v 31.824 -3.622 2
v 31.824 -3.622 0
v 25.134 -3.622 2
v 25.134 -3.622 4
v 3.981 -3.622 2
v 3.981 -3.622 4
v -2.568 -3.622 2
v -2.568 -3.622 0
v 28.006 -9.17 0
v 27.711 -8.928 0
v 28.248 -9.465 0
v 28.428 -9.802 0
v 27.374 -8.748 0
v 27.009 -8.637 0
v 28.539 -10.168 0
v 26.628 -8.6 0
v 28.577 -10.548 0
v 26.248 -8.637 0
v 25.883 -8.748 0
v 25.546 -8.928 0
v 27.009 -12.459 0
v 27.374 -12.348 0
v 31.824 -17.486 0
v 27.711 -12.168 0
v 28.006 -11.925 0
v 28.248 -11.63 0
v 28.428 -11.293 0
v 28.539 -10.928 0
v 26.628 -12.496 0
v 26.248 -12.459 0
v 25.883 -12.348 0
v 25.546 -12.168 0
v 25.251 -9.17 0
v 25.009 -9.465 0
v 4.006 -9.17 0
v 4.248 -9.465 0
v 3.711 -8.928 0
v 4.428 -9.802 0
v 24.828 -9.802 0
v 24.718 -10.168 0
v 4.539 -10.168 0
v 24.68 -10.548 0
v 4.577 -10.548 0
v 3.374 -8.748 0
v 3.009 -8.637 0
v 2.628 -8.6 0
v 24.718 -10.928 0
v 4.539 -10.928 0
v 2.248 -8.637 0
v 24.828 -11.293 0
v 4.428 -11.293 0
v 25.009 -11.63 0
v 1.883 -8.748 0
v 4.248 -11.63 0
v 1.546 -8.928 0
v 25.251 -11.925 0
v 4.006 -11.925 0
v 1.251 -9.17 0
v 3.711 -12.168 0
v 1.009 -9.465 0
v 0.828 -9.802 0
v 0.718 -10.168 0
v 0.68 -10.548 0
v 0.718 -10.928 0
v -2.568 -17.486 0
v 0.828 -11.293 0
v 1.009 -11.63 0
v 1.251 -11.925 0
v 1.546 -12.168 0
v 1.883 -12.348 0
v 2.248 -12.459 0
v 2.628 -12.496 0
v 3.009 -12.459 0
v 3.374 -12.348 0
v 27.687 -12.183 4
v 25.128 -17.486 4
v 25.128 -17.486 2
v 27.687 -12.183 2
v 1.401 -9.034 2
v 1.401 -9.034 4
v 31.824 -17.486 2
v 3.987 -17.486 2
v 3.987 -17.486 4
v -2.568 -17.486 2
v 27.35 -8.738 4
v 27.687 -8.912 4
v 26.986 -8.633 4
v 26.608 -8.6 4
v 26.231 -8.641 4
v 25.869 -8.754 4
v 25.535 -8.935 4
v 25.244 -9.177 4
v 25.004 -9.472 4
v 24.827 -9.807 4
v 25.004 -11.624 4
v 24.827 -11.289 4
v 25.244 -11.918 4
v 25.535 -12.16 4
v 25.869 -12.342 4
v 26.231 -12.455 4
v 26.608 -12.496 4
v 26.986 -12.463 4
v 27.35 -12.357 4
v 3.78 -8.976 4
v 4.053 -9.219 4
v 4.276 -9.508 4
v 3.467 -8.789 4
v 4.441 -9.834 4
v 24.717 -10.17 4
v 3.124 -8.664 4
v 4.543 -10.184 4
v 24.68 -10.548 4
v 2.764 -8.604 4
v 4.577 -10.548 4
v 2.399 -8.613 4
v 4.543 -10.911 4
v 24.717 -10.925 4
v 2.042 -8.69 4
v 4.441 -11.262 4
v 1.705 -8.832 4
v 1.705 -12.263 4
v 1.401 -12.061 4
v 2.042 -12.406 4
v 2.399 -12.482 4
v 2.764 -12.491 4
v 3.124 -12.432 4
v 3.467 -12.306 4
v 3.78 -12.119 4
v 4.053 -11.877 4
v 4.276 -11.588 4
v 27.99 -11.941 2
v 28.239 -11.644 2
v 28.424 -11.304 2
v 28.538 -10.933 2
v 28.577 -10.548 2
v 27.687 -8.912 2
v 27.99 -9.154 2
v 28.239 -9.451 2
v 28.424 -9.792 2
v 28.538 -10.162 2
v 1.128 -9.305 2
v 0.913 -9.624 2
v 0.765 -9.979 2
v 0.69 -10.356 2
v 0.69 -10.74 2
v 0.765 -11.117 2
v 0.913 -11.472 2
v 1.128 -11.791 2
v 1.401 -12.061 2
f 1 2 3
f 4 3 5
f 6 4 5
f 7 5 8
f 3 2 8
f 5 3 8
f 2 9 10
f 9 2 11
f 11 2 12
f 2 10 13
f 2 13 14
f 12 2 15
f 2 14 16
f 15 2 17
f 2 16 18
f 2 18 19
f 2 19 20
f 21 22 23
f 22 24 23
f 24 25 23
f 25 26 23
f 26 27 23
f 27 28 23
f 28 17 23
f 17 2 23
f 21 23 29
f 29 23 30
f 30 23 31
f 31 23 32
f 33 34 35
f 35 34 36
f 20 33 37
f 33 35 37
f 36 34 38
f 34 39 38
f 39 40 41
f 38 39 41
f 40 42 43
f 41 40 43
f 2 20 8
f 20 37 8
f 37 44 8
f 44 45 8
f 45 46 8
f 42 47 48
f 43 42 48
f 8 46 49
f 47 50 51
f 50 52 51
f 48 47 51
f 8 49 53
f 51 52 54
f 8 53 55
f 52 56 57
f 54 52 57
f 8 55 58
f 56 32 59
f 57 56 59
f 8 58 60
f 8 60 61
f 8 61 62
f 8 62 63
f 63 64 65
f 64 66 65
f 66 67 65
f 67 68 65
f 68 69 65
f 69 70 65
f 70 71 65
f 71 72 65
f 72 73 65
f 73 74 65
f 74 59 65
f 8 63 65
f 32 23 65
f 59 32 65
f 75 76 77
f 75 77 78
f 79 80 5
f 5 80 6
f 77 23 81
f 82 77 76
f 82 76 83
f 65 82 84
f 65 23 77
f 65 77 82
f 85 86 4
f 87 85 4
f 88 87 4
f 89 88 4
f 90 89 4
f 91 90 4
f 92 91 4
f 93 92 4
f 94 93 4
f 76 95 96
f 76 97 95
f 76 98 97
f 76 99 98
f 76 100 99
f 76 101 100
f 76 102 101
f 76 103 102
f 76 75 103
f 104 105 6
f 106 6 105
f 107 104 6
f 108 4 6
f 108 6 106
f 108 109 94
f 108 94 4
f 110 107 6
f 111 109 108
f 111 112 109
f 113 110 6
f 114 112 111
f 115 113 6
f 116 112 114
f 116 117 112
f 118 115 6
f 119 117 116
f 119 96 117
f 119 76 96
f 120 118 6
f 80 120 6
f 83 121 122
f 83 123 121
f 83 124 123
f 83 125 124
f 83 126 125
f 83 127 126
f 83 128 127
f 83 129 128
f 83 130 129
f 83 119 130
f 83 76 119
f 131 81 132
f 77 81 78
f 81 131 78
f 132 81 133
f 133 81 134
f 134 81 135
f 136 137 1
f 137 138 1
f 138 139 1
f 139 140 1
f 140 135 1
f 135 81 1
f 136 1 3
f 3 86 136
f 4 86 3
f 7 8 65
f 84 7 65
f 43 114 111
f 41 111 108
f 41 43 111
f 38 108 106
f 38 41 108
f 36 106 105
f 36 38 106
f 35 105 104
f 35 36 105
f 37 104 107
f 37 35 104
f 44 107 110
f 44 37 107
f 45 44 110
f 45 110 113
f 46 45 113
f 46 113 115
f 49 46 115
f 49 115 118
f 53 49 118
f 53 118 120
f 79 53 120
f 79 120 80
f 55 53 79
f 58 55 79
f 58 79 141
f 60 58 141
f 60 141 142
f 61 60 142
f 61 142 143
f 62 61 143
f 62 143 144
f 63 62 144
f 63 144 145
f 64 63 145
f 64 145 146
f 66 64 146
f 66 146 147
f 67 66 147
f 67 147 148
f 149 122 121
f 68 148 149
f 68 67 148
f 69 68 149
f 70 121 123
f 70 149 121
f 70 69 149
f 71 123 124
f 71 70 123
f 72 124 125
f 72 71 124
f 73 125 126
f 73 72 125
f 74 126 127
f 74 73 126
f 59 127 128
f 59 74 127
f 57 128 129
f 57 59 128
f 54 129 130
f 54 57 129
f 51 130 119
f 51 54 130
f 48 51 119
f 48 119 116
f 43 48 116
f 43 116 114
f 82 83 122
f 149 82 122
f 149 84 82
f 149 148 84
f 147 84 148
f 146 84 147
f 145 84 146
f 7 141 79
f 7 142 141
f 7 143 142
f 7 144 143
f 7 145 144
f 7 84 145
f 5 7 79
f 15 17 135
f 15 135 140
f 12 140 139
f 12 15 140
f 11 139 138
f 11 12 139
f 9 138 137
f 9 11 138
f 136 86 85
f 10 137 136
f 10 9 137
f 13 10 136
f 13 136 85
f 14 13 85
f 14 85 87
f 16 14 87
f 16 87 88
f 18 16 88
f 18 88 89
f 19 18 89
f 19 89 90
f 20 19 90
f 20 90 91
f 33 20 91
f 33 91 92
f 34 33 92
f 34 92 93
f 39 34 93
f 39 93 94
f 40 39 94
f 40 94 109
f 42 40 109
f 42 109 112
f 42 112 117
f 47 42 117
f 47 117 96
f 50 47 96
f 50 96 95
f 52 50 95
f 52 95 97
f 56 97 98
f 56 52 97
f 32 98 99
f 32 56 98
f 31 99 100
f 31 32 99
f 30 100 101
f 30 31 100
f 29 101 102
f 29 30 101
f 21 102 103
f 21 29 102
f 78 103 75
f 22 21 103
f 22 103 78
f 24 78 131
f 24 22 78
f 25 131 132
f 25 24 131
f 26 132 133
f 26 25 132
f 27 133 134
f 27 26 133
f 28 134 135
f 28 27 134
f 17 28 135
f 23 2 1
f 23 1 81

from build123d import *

# Parameters (mm, degrees)
SKETCH3_W           = 34.39206684
SKETCH3_H           = 13.864626052
SKETCH3_R           = 1.948262706
BOSS_EXTRUDE1_DEPTH = 4
CUT_EXTRUDE2_DEPTH  = 2


with BuildPart() as part:
    # Sketch3 → Boss-Extrude1 (new body)
    with BuildSketch(Plane(origin=(0, 0, 0), x_dir=(-1, 0, 0), z_dir=(0, 0, 1))):
        with Locations((-14.628449162, 10.554141489)):
            Rectangle(SKETCH3_W, SKETCH3_H)
        with Locations(Location((-26.628449162, 10.547774914, 0), (0, 0, 180))):
            Circle(SKETCH3_R, mode=Mode.SUBTRACT)
        with Locations(Location((-2.628449162, 10.547774914, 0), (0, 0, 180))):
            Circle(SKETCH3_R, mode=Mode.SUBTRACT)
    extrude(amount=BOSS_EXTRUDE1_DEPTH)

    # Sketch4 → Cut-Extrude2 (cut)
    with BuildSketch(Plane.XY.offset(4)):
        Polygon((3.987302292, -3.609095314), (-2.567584258, -3.609095314), (-2.567584258, -17.486454515), (3.987302292, -17.486454515), (0.680186456, -10.547774914), align=None)
        Polygon((25.128096542, -3.609095314), (31.824482582, -3.609095314), (31.824482582, -17.486454515), (25.128096542, -17.486454515), (28.476289562, -10.547774914), align=None)
    extrude(amount=-CUT_EXTRUDE2_DEPTH, mode=Mode.SUBTRACT)


solid = part.part
